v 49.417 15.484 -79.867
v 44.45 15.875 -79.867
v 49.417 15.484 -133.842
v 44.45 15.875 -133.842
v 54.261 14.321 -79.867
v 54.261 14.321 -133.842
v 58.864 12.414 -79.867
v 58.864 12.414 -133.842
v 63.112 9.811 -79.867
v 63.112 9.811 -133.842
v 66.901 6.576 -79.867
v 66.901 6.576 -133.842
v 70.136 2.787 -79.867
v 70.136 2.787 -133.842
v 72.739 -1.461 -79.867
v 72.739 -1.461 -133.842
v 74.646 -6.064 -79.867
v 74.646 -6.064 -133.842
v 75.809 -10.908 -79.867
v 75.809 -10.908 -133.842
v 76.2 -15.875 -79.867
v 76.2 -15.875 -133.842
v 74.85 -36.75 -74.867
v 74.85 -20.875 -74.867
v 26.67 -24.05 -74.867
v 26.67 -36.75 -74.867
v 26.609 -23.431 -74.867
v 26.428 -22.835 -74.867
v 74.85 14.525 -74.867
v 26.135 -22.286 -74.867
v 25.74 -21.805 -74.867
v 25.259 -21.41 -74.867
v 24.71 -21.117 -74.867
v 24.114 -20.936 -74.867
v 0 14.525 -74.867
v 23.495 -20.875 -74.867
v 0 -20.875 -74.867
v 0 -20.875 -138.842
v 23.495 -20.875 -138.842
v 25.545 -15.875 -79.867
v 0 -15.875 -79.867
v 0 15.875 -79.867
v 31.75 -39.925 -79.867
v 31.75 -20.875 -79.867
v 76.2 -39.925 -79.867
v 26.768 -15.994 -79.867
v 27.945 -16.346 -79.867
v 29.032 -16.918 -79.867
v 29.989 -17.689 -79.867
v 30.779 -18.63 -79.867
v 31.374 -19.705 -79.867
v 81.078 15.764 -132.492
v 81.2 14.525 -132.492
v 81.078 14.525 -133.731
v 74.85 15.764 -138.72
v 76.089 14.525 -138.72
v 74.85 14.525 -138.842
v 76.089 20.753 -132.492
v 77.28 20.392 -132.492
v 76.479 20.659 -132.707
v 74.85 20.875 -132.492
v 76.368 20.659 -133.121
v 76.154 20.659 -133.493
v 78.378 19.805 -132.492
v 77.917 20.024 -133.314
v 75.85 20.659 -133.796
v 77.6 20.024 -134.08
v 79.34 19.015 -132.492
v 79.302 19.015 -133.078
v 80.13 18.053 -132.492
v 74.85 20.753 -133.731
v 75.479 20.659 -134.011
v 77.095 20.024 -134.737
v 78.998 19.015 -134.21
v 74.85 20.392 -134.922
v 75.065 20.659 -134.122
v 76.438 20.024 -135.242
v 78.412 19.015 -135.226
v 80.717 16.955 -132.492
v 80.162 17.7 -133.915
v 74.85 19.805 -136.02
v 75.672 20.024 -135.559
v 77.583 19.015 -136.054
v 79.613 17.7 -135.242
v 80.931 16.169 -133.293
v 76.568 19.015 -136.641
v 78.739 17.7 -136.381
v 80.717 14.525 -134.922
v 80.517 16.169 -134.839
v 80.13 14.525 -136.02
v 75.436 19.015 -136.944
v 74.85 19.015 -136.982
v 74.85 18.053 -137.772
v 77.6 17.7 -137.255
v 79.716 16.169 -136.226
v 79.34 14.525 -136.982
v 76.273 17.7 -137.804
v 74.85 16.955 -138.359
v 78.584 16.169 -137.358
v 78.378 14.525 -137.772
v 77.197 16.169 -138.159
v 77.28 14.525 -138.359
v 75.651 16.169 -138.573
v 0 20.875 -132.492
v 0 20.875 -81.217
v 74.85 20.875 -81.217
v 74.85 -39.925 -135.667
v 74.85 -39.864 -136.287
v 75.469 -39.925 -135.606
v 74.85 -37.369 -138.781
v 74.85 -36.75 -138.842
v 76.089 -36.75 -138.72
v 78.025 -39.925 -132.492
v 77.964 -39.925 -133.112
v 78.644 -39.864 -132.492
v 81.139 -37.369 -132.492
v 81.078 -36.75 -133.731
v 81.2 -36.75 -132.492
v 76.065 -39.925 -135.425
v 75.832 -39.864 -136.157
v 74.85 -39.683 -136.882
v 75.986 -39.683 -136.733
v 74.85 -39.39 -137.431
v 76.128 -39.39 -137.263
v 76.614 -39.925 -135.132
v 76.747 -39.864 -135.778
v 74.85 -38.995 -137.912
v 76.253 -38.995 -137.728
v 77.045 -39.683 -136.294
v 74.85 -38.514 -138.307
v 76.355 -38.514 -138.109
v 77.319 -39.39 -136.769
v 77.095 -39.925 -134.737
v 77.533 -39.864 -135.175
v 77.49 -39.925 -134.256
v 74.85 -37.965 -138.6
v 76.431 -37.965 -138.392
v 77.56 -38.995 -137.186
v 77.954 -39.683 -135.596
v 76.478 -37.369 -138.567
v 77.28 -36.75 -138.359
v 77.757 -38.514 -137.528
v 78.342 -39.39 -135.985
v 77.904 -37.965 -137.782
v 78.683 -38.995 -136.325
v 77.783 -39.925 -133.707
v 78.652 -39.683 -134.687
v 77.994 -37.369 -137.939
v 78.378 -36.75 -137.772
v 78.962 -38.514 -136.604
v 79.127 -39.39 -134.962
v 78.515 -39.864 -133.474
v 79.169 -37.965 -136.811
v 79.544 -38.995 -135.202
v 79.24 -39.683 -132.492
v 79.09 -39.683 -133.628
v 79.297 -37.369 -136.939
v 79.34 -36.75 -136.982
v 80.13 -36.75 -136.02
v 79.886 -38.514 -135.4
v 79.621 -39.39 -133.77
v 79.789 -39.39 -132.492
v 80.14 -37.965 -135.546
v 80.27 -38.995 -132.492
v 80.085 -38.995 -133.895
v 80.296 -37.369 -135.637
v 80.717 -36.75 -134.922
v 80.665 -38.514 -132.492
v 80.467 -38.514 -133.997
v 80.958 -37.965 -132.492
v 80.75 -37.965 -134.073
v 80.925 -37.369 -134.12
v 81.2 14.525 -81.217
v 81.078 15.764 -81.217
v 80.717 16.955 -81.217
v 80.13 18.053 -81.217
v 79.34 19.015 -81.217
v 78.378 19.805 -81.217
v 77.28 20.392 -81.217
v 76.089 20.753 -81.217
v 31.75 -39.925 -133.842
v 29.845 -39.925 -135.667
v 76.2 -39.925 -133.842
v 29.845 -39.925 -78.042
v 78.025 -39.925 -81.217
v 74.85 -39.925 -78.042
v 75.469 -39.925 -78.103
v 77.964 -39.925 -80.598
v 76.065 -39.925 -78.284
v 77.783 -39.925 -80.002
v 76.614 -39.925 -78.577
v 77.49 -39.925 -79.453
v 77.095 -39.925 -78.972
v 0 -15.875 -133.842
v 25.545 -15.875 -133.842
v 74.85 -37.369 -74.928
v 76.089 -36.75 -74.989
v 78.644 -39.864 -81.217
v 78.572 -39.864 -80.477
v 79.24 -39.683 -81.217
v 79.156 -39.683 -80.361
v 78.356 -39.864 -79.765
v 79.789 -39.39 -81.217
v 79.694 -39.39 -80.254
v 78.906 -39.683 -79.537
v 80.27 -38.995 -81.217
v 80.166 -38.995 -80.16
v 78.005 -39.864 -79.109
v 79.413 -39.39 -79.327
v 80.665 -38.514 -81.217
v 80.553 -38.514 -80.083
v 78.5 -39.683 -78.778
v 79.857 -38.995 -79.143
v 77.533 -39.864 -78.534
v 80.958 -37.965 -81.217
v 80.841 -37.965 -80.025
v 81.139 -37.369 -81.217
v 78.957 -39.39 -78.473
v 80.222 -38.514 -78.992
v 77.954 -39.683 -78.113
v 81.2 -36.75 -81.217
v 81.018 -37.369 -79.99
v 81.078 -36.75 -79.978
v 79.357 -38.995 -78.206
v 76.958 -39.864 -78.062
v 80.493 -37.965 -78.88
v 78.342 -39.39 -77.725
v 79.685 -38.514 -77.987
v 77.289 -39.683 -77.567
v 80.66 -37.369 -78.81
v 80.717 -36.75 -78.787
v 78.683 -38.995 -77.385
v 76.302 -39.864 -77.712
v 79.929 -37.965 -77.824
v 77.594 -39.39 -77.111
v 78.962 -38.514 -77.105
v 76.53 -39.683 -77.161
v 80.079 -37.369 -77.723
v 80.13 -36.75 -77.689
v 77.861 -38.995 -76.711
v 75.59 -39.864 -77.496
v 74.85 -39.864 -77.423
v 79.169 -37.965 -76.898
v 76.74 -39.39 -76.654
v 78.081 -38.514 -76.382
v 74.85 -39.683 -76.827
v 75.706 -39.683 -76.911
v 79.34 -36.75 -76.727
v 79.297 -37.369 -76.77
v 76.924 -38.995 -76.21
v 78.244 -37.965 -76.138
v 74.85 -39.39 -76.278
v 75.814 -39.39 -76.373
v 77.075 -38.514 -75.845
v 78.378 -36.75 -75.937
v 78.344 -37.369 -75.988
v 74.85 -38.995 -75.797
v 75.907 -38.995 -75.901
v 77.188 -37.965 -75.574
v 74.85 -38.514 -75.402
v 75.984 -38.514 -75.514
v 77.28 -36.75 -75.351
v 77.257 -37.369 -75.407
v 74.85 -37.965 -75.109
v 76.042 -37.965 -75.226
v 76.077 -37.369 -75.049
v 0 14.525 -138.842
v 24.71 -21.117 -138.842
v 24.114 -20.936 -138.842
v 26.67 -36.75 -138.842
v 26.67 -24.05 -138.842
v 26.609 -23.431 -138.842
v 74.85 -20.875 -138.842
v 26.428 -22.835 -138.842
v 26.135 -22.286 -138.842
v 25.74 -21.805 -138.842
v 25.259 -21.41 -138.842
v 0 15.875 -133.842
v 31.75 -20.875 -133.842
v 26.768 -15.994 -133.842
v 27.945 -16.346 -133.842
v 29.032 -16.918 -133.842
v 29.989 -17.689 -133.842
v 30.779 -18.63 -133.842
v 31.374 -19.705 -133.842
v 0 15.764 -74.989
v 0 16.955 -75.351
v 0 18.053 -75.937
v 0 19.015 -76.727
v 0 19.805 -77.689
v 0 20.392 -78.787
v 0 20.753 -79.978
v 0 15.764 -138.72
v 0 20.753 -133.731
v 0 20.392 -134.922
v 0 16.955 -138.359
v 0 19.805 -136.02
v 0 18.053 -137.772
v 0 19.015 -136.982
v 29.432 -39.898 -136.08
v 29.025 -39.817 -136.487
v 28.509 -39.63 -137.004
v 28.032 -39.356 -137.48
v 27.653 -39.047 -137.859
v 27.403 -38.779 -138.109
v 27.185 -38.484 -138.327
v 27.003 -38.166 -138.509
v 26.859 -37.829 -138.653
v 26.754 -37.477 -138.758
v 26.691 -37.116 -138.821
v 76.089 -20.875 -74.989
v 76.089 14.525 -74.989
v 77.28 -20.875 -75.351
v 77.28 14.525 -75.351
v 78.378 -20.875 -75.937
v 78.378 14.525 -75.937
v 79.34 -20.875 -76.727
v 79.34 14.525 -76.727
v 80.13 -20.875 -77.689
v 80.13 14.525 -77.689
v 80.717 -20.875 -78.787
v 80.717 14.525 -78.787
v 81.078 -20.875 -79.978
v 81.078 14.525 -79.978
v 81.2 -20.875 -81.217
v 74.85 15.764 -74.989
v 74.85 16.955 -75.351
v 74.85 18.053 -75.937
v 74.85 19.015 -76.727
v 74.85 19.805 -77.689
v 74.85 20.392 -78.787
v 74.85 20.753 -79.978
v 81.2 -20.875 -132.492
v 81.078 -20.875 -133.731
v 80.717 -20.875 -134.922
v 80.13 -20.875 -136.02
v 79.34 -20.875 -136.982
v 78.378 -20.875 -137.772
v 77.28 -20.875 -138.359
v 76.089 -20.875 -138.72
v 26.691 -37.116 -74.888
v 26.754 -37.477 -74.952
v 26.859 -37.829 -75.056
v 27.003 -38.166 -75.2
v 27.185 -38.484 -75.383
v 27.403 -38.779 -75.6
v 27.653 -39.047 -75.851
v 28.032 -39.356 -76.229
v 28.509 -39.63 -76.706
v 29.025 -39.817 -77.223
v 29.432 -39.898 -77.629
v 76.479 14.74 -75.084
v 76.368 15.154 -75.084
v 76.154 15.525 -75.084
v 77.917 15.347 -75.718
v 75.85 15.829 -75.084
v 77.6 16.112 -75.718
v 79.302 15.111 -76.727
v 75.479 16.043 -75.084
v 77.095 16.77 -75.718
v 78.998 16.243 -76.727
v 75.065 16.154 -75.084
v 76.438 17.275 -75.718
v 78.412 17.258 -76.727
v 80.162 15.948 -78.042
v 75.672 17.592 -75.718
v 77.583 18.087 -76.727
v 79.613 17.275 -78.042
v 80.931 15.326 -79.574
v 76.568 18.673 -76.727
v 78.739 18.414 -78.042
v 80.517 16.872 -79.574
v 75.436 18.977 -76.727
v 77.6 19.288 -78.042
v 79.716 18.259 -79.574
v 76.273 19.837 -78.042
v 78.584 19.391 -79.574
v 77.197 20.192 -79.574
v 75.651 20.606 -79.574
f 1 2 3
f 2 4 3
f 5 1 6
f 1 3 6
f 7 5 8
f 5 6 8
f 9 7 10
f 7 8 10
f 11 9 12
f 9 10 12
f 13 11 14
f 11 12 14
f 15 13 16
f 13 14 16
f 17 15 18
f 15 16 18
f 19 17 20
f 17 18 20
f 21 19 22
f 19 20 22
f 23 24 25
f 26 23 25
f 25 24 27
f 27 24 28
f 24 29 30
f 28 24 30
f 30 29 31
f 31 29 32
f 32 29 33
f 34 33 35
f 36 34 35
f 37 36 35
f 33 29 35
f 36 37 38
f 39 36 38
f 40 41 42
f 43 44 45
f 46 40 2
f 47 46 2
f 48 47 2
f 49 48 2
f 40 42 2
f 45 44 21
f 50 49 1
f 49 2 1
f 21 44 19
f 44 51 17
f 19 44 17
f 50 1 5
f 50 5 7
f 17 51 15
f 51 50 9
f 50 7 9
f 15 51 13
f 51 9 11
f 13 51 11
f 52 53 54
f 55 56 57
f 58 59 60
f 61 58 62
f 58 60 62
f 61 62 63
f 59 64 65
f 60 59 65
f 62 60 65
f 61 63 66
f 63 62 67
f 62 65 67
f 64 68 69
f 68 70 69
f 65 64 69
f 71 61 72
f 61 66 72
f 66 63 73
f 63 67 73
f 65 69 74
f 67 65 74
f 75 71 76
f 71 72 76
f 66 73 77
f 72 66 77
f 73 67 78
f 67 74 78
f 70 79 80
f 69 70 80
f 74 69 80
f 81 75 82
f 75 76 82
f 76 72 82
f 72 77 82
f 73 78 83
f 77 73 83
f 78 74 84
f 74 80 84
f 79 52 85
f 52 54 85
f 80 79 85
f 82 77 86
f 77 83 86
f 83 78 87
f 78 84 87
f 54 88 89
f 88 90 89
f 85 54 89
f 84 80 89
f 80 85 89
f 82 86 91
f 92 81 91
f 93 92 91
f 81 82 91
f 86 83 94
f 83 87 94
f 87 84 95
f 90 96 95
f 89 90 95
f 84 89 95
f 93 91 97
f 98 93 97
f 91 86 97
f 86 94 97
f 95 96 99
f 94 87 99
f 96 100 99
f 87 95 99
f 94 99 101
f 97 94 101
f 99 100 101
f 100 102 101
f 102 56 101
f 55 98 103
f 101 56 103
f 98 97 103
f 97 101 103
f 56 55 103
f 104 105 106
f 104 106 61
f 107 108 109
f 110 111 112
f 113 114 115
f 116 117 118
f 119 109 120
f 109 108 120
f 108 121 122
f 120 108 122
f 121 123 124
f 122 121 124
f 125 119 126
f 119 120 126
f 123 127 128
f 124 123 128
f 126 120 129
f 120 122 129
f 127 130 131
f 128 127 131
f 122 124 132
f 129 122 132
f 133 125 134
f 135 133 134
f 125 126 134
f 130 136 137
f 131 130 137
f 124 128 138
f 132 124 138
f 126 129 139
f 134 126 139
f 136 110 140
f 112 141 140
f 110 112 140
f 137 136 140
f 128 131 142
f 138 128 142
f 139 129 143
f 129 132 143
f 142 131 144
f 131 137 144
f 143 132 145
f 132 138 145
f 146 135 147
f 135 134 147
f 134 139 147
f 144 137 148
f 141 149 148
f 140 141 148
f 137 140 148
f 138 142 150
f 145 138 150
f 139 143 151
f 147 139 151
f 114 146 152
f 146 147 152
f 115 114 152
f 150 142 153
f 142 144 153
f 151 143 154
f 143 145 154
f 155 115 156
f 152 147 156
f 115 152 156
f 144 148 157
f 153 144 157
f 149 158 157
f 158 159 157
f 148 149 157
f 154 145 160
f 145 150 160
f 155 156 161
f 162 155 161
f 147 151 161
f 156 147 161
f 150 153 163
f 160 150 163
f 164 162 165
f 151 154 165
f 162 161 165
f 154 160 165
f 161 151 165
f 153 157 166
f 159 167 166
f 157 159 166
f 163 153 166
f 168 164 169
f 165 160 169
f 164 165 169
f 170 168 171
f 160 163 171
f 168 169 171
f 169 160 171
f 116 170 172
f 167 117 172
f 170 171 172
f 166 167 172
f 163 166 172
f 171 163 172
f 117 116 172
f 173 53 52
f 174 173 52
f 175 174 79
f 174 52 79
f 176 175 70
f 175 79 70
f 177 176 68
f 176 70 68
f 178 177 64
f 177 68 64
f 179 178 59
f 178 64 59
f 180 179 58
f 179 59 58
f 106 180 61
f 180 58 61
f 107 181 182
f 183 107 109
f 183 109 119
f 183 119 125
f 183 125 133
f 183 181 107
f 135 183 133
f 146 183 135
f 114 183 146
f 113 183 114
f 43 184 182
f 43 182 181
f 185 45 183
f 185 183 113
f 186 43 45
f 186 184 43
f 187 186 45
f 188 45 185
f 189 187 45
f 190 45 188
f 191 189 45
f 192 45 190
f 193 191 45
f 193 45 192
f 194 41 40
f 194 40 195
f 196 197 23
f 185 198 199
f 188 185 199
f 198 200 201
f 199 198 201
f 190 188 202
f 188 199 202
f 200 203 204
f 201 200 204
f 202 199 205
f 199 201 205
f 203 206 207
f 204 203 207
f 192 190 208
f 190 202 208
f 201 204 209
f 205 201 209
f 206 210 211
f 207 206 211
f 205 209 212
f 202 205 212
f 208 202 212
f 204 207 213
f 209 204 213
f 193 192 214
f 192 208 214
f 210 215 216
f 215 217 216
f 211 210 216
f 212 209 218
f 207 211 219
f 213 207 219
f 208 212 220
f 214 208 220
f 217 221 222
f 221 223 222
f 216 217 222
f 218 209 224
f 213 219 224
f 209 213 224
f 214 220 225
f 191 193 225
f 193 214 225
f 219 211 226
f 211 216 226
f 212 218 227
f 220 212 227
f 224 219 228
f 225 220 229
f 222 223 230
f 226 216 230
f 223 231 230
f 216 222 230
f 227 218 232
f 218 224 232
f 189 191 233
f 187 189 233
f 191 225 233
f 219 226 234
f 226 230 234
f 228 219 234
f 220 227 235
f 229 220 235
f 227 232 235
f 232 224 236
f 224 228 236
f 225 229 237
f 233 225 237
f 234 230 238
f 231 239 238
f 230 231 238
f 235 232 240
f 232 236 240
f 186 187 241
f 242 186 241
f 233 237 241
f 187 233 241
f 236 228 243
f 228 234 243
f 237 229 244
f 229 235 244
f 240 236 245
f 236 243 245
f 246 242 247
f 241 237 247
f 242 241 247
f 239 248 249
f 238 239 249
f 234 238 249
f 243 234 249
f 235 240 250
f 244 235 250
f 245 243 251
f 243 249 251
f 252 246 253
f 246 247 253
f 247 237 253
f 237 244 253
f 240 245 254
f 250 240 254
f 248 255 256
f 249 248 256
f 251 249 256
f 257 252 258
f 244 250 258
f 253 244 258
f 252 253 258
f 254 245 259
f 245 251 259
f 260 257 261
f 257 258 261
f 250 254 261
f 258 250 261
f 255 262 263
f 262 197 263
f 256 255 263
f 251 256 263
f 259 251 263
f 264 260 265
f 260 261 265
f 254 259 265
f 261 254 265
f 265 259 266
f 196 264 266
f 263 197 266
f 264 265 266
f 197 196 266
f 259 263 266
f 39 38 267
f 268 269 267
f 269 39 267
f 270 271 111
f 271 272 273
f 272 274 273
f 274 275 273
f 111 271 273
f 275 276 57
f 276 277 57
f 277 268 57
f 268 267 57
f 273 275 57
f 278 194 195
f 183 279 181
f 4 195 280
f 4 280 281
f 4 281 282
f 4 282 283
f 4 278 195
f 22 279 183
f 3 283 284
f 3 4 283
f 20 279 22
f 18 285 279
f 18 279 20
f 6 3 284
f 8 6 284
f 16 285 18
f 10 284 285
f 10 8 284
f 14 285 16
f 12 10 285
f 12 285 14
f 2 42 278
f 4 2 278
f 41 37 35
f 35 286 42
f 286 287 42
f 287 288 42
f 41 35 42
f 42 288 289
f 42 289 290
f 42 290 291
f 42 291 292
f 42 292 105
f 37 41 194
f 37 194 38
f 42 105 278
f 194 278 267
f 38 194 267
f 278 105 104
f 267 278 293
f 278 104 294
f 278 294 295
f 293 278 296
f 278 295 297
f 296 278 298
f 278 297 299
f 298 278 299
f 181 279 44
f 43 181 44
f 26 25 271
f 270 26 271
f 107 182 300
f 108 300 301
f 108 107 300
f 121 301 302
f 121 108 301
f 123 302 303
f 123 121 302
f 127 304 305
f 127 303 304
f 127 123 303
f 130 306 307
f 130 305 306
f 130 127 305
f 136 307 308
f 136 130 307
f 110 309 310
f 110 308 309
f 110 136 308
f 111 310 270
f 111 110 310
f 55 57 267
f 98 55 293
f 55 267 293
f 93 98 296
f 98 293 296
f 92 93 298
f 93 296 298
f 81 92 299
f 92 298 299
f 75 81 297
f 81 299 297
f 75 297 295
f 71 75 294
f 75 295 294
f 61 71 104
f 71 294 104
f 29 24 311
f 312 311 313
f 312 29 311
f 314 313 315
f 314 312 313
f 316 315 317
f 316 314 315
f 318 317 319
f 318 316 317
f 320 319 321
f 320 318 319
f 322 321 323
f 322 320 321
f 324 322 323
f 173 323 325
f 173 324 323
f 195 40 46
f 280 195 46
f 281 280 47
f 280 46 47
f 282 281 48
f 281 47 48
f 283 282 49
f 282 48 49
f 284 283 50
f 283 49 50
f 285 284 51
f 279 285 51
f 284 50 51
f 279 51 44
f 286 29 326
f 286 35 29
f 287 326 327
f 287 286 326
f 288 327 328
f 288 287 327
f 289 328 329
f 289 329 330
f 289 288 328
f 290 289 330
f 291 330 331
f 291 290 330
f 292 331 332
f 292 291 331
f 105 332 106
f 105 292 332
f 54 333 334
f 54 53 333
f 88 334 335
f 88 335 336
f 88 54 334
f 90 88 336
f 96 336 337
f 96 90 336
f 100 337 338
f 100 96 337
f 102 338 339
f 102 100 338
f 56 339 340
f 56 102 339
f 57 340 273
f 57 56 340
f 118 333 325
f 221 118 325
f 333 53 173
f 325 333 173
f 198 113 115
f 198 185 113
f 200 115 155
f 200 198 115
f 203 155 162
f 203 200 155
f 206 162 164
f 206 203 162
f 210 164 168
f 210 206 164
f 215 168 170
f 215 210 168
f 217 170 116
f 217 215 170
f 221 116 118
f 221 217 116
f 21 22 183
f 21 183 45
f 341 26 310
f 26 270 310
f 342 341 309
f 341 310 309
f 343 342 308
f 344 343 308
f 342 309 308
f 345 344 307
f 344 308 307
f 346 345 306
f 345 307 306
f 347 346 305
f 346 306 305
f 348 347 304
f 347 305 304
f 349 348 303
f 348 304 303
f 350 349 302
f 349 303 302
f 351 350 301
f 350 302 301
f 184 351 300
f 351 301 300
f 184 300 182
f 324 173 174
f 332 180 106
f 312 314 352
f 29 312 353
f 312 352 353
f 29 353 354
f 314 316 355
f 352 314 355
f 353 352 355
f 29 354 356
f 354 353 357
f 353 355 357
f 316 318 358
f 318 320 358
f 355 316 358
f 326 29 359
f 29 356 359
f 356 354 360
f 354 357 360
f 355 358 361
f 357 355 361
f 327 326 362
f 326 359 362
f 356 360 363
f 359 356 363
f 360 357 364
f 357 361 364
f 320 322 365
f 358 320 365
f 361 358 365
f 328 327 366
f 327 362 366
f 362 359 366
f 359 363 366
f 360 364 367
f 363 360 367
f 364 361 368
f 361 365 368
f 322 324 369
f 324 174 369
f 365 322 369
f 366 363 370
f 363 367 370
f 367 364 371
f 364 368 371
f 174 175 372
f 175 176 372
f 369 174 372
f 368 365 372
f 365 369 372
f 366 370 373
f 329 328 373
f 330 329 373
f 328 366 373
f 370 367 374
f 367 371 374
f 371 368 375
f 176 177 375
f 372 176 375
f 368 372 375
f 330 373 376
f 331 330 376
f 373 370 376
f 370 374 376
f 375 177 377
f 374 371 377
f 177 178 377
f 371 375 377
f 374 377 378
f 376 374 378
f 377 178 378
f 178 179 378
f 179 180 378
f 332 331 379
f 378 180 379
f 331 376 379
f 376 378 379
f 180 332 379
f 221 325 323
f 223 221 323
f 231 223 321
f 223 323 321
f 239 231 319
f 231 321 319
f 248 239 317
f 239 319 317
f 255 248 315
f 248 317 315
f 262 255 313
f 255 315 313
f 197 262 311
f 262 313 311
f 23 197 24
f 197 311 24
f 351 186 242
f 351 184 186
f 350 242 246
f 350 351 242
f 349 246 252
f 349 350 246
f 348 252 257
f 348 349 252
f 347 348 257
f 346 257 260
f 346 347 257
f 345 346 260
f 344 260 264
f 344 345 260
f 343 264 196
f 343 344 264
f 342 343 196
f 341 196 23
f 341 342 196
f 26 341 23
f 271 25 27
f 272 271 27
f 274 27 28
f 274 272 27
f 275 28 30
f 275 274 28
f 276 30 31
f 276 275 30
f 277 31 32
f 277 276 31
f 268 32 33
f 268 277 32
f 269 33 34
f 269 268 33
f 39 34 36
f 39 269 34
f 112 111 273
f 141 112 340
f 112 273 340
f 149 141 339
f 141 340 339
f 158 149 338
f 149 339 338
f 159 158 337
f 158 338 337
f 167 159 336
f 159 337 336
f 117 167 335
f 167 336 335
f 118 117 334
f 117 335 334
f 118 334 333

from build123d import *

# Parameters (mm, degrees)
SKETCH1_W           = 53.975
SKETCH1_H           = 31.75
BOSS_EXTRUDE1_DEPTH = 76.2
SHELL1_T            = 5
SKETCH2_W           = 44.45
SKETCH2_H           = 53.975
CUT_EXTRUDE1_DEPTH  = 5
FILLET1_R           = 31.75
FILLET2_R           = 6.35
FILLET3_R           = 6.35
SKETCH3_W           = 44.45
SKETCH3_H           = 53.975
BOSS_EXTRUDE2_DEPTH = 19.05
FILLET5_R           = 3.175
FILLET6_R           = 3.175


with BuildPart() as part:
    # Sketch1 → Boss-Extrude1 (new body)
    with BuildSketch(Plane(origin=(0, 0, 0), x_dir=(0, 0, -1), z_dir=(1, 0, 0))):
        with Locations((106.854663617, 0)):
            Rectangle(SKETCH1_W, SKETCH1_H)
    extrude(amount=BOSS_EXTRUDE1_DEPTH)

    # Shell1
    shell1_openings = [part.faces().sort_by_distance(p)[0] for p in [
        (0, 0, -106.854663617),
    ]]
    offset(amount=SHELL1_T, openings=shell1_openings, kind=Kind.INTERSECTION)

    # Sketch2 → Cut-Extrude1 (cut)
    with BuildSketch(Plane(origin=(0, -20.875, 0), x_dir=(-1, 0, 0), z_dir=(0, -1, 0))):
        with Locations((-53.975, 106.854663617)):
            Rectangle(SKETCH2_W, SKETCH2_H)
    extrude(amount=-CUT_EXTRUDE1_DEPTH, mode=Mode.SUBTRACT)

    # Fillet1
    fillet1_edges = [part.edges().sort_by_distance(p)[0] for p in [
        (76.2, 15.875, -106.854663617),
    ]]
    fillet(fillet1_edges, radius=FILLET1_R)

    # Fillet2
    # the kernel refuses this fillet: 6.35 mm, written as the material it takes off along each edge
    with BuildSketch(Plane(origin=(31.75, -15.875, -79.867163617), x_dir=(-1, 0, 0), z_dir=(0, 0, -1))) as fillet2_piece_1:
        with BuildLine():
            CenterArc((6.204836823, -6.35), FILLET2_R, 90, 77.725329785)
            Line((0, -5), (0, 0))
            Line((0, 0), (6.204836823, 0))
        make_face()
    extrude(amount=53.975, mode=Mode.SUBTRACT)

    # Fillet3
    fillet3_edges = [part.edges().sort_by_distance(p)[0] for p in [
        (81.2, 0, -138.842163617),
        (81.2, 20.875, -106.854663617),
        (81.2, 0, -74.867163617),
        (40.6, 20.875, -74.867163617),
        (40.6, 20.875, -138.842163617),
    ]]
    fillet(fillet3_edges, radius=FILLET3_R)

    # Sketch3 → Boss-Extrude2 (add)
    with BuildSketch(Plane.XZ.offset(20.875)):
        with BuildLine():
            Line((26.67, -74.867163617), (26.67, -138.842163617))
            Line((26.67, -138.842163617), (74.85, -138.842163617))
            ThreePointArc((74.85, -138.842163617), (79.340128061, -136.982291678), (81.2, -132.492163617))
            Line((81.2, -132.492163617), (81.2, -81.217163617))
            ThreePointArc((81.2, -81.217163617), (79.340128061, -76.727035557), (74.85, -74.867163617))
            Line((74.85, -74.867163617), (26.67, -74.867163617))
        make_face()
        with Locations((53.975, -106.854663617)):
            Rectangle(SKETCH3_W, SKETCH3_H, mode=Mode.SUBTRACT)
    extrude(amount=BOSS_EXTRUDE2_DEPTH)

    # Fillet5
    fillet5_edges = [part.edges().sort_by_distance(p)[0] for p in [
        (26.67, -20.875, -106.854663617),
    ]]
    fillet(fillet5_edges, radius=FILLET5_R)

    # Fillet6
    fillet6_edges = [part.edges().sort_by_distance(p)[0] for p in [
        (26.67, -39.925, -106.854663617),
        (50.76, -39.925, -138.842163617),
        (79.340128061, -39.925, -136.982291678),
        (81.2, -39.925, -106.854663617),
        (79.340128061, -39.925, -76.727035557),
        (50.76, -39.925, -74.867163617),
    ]]
    fillet(fillet6_edges, radius=FILLET6_R)


solid = part.part
